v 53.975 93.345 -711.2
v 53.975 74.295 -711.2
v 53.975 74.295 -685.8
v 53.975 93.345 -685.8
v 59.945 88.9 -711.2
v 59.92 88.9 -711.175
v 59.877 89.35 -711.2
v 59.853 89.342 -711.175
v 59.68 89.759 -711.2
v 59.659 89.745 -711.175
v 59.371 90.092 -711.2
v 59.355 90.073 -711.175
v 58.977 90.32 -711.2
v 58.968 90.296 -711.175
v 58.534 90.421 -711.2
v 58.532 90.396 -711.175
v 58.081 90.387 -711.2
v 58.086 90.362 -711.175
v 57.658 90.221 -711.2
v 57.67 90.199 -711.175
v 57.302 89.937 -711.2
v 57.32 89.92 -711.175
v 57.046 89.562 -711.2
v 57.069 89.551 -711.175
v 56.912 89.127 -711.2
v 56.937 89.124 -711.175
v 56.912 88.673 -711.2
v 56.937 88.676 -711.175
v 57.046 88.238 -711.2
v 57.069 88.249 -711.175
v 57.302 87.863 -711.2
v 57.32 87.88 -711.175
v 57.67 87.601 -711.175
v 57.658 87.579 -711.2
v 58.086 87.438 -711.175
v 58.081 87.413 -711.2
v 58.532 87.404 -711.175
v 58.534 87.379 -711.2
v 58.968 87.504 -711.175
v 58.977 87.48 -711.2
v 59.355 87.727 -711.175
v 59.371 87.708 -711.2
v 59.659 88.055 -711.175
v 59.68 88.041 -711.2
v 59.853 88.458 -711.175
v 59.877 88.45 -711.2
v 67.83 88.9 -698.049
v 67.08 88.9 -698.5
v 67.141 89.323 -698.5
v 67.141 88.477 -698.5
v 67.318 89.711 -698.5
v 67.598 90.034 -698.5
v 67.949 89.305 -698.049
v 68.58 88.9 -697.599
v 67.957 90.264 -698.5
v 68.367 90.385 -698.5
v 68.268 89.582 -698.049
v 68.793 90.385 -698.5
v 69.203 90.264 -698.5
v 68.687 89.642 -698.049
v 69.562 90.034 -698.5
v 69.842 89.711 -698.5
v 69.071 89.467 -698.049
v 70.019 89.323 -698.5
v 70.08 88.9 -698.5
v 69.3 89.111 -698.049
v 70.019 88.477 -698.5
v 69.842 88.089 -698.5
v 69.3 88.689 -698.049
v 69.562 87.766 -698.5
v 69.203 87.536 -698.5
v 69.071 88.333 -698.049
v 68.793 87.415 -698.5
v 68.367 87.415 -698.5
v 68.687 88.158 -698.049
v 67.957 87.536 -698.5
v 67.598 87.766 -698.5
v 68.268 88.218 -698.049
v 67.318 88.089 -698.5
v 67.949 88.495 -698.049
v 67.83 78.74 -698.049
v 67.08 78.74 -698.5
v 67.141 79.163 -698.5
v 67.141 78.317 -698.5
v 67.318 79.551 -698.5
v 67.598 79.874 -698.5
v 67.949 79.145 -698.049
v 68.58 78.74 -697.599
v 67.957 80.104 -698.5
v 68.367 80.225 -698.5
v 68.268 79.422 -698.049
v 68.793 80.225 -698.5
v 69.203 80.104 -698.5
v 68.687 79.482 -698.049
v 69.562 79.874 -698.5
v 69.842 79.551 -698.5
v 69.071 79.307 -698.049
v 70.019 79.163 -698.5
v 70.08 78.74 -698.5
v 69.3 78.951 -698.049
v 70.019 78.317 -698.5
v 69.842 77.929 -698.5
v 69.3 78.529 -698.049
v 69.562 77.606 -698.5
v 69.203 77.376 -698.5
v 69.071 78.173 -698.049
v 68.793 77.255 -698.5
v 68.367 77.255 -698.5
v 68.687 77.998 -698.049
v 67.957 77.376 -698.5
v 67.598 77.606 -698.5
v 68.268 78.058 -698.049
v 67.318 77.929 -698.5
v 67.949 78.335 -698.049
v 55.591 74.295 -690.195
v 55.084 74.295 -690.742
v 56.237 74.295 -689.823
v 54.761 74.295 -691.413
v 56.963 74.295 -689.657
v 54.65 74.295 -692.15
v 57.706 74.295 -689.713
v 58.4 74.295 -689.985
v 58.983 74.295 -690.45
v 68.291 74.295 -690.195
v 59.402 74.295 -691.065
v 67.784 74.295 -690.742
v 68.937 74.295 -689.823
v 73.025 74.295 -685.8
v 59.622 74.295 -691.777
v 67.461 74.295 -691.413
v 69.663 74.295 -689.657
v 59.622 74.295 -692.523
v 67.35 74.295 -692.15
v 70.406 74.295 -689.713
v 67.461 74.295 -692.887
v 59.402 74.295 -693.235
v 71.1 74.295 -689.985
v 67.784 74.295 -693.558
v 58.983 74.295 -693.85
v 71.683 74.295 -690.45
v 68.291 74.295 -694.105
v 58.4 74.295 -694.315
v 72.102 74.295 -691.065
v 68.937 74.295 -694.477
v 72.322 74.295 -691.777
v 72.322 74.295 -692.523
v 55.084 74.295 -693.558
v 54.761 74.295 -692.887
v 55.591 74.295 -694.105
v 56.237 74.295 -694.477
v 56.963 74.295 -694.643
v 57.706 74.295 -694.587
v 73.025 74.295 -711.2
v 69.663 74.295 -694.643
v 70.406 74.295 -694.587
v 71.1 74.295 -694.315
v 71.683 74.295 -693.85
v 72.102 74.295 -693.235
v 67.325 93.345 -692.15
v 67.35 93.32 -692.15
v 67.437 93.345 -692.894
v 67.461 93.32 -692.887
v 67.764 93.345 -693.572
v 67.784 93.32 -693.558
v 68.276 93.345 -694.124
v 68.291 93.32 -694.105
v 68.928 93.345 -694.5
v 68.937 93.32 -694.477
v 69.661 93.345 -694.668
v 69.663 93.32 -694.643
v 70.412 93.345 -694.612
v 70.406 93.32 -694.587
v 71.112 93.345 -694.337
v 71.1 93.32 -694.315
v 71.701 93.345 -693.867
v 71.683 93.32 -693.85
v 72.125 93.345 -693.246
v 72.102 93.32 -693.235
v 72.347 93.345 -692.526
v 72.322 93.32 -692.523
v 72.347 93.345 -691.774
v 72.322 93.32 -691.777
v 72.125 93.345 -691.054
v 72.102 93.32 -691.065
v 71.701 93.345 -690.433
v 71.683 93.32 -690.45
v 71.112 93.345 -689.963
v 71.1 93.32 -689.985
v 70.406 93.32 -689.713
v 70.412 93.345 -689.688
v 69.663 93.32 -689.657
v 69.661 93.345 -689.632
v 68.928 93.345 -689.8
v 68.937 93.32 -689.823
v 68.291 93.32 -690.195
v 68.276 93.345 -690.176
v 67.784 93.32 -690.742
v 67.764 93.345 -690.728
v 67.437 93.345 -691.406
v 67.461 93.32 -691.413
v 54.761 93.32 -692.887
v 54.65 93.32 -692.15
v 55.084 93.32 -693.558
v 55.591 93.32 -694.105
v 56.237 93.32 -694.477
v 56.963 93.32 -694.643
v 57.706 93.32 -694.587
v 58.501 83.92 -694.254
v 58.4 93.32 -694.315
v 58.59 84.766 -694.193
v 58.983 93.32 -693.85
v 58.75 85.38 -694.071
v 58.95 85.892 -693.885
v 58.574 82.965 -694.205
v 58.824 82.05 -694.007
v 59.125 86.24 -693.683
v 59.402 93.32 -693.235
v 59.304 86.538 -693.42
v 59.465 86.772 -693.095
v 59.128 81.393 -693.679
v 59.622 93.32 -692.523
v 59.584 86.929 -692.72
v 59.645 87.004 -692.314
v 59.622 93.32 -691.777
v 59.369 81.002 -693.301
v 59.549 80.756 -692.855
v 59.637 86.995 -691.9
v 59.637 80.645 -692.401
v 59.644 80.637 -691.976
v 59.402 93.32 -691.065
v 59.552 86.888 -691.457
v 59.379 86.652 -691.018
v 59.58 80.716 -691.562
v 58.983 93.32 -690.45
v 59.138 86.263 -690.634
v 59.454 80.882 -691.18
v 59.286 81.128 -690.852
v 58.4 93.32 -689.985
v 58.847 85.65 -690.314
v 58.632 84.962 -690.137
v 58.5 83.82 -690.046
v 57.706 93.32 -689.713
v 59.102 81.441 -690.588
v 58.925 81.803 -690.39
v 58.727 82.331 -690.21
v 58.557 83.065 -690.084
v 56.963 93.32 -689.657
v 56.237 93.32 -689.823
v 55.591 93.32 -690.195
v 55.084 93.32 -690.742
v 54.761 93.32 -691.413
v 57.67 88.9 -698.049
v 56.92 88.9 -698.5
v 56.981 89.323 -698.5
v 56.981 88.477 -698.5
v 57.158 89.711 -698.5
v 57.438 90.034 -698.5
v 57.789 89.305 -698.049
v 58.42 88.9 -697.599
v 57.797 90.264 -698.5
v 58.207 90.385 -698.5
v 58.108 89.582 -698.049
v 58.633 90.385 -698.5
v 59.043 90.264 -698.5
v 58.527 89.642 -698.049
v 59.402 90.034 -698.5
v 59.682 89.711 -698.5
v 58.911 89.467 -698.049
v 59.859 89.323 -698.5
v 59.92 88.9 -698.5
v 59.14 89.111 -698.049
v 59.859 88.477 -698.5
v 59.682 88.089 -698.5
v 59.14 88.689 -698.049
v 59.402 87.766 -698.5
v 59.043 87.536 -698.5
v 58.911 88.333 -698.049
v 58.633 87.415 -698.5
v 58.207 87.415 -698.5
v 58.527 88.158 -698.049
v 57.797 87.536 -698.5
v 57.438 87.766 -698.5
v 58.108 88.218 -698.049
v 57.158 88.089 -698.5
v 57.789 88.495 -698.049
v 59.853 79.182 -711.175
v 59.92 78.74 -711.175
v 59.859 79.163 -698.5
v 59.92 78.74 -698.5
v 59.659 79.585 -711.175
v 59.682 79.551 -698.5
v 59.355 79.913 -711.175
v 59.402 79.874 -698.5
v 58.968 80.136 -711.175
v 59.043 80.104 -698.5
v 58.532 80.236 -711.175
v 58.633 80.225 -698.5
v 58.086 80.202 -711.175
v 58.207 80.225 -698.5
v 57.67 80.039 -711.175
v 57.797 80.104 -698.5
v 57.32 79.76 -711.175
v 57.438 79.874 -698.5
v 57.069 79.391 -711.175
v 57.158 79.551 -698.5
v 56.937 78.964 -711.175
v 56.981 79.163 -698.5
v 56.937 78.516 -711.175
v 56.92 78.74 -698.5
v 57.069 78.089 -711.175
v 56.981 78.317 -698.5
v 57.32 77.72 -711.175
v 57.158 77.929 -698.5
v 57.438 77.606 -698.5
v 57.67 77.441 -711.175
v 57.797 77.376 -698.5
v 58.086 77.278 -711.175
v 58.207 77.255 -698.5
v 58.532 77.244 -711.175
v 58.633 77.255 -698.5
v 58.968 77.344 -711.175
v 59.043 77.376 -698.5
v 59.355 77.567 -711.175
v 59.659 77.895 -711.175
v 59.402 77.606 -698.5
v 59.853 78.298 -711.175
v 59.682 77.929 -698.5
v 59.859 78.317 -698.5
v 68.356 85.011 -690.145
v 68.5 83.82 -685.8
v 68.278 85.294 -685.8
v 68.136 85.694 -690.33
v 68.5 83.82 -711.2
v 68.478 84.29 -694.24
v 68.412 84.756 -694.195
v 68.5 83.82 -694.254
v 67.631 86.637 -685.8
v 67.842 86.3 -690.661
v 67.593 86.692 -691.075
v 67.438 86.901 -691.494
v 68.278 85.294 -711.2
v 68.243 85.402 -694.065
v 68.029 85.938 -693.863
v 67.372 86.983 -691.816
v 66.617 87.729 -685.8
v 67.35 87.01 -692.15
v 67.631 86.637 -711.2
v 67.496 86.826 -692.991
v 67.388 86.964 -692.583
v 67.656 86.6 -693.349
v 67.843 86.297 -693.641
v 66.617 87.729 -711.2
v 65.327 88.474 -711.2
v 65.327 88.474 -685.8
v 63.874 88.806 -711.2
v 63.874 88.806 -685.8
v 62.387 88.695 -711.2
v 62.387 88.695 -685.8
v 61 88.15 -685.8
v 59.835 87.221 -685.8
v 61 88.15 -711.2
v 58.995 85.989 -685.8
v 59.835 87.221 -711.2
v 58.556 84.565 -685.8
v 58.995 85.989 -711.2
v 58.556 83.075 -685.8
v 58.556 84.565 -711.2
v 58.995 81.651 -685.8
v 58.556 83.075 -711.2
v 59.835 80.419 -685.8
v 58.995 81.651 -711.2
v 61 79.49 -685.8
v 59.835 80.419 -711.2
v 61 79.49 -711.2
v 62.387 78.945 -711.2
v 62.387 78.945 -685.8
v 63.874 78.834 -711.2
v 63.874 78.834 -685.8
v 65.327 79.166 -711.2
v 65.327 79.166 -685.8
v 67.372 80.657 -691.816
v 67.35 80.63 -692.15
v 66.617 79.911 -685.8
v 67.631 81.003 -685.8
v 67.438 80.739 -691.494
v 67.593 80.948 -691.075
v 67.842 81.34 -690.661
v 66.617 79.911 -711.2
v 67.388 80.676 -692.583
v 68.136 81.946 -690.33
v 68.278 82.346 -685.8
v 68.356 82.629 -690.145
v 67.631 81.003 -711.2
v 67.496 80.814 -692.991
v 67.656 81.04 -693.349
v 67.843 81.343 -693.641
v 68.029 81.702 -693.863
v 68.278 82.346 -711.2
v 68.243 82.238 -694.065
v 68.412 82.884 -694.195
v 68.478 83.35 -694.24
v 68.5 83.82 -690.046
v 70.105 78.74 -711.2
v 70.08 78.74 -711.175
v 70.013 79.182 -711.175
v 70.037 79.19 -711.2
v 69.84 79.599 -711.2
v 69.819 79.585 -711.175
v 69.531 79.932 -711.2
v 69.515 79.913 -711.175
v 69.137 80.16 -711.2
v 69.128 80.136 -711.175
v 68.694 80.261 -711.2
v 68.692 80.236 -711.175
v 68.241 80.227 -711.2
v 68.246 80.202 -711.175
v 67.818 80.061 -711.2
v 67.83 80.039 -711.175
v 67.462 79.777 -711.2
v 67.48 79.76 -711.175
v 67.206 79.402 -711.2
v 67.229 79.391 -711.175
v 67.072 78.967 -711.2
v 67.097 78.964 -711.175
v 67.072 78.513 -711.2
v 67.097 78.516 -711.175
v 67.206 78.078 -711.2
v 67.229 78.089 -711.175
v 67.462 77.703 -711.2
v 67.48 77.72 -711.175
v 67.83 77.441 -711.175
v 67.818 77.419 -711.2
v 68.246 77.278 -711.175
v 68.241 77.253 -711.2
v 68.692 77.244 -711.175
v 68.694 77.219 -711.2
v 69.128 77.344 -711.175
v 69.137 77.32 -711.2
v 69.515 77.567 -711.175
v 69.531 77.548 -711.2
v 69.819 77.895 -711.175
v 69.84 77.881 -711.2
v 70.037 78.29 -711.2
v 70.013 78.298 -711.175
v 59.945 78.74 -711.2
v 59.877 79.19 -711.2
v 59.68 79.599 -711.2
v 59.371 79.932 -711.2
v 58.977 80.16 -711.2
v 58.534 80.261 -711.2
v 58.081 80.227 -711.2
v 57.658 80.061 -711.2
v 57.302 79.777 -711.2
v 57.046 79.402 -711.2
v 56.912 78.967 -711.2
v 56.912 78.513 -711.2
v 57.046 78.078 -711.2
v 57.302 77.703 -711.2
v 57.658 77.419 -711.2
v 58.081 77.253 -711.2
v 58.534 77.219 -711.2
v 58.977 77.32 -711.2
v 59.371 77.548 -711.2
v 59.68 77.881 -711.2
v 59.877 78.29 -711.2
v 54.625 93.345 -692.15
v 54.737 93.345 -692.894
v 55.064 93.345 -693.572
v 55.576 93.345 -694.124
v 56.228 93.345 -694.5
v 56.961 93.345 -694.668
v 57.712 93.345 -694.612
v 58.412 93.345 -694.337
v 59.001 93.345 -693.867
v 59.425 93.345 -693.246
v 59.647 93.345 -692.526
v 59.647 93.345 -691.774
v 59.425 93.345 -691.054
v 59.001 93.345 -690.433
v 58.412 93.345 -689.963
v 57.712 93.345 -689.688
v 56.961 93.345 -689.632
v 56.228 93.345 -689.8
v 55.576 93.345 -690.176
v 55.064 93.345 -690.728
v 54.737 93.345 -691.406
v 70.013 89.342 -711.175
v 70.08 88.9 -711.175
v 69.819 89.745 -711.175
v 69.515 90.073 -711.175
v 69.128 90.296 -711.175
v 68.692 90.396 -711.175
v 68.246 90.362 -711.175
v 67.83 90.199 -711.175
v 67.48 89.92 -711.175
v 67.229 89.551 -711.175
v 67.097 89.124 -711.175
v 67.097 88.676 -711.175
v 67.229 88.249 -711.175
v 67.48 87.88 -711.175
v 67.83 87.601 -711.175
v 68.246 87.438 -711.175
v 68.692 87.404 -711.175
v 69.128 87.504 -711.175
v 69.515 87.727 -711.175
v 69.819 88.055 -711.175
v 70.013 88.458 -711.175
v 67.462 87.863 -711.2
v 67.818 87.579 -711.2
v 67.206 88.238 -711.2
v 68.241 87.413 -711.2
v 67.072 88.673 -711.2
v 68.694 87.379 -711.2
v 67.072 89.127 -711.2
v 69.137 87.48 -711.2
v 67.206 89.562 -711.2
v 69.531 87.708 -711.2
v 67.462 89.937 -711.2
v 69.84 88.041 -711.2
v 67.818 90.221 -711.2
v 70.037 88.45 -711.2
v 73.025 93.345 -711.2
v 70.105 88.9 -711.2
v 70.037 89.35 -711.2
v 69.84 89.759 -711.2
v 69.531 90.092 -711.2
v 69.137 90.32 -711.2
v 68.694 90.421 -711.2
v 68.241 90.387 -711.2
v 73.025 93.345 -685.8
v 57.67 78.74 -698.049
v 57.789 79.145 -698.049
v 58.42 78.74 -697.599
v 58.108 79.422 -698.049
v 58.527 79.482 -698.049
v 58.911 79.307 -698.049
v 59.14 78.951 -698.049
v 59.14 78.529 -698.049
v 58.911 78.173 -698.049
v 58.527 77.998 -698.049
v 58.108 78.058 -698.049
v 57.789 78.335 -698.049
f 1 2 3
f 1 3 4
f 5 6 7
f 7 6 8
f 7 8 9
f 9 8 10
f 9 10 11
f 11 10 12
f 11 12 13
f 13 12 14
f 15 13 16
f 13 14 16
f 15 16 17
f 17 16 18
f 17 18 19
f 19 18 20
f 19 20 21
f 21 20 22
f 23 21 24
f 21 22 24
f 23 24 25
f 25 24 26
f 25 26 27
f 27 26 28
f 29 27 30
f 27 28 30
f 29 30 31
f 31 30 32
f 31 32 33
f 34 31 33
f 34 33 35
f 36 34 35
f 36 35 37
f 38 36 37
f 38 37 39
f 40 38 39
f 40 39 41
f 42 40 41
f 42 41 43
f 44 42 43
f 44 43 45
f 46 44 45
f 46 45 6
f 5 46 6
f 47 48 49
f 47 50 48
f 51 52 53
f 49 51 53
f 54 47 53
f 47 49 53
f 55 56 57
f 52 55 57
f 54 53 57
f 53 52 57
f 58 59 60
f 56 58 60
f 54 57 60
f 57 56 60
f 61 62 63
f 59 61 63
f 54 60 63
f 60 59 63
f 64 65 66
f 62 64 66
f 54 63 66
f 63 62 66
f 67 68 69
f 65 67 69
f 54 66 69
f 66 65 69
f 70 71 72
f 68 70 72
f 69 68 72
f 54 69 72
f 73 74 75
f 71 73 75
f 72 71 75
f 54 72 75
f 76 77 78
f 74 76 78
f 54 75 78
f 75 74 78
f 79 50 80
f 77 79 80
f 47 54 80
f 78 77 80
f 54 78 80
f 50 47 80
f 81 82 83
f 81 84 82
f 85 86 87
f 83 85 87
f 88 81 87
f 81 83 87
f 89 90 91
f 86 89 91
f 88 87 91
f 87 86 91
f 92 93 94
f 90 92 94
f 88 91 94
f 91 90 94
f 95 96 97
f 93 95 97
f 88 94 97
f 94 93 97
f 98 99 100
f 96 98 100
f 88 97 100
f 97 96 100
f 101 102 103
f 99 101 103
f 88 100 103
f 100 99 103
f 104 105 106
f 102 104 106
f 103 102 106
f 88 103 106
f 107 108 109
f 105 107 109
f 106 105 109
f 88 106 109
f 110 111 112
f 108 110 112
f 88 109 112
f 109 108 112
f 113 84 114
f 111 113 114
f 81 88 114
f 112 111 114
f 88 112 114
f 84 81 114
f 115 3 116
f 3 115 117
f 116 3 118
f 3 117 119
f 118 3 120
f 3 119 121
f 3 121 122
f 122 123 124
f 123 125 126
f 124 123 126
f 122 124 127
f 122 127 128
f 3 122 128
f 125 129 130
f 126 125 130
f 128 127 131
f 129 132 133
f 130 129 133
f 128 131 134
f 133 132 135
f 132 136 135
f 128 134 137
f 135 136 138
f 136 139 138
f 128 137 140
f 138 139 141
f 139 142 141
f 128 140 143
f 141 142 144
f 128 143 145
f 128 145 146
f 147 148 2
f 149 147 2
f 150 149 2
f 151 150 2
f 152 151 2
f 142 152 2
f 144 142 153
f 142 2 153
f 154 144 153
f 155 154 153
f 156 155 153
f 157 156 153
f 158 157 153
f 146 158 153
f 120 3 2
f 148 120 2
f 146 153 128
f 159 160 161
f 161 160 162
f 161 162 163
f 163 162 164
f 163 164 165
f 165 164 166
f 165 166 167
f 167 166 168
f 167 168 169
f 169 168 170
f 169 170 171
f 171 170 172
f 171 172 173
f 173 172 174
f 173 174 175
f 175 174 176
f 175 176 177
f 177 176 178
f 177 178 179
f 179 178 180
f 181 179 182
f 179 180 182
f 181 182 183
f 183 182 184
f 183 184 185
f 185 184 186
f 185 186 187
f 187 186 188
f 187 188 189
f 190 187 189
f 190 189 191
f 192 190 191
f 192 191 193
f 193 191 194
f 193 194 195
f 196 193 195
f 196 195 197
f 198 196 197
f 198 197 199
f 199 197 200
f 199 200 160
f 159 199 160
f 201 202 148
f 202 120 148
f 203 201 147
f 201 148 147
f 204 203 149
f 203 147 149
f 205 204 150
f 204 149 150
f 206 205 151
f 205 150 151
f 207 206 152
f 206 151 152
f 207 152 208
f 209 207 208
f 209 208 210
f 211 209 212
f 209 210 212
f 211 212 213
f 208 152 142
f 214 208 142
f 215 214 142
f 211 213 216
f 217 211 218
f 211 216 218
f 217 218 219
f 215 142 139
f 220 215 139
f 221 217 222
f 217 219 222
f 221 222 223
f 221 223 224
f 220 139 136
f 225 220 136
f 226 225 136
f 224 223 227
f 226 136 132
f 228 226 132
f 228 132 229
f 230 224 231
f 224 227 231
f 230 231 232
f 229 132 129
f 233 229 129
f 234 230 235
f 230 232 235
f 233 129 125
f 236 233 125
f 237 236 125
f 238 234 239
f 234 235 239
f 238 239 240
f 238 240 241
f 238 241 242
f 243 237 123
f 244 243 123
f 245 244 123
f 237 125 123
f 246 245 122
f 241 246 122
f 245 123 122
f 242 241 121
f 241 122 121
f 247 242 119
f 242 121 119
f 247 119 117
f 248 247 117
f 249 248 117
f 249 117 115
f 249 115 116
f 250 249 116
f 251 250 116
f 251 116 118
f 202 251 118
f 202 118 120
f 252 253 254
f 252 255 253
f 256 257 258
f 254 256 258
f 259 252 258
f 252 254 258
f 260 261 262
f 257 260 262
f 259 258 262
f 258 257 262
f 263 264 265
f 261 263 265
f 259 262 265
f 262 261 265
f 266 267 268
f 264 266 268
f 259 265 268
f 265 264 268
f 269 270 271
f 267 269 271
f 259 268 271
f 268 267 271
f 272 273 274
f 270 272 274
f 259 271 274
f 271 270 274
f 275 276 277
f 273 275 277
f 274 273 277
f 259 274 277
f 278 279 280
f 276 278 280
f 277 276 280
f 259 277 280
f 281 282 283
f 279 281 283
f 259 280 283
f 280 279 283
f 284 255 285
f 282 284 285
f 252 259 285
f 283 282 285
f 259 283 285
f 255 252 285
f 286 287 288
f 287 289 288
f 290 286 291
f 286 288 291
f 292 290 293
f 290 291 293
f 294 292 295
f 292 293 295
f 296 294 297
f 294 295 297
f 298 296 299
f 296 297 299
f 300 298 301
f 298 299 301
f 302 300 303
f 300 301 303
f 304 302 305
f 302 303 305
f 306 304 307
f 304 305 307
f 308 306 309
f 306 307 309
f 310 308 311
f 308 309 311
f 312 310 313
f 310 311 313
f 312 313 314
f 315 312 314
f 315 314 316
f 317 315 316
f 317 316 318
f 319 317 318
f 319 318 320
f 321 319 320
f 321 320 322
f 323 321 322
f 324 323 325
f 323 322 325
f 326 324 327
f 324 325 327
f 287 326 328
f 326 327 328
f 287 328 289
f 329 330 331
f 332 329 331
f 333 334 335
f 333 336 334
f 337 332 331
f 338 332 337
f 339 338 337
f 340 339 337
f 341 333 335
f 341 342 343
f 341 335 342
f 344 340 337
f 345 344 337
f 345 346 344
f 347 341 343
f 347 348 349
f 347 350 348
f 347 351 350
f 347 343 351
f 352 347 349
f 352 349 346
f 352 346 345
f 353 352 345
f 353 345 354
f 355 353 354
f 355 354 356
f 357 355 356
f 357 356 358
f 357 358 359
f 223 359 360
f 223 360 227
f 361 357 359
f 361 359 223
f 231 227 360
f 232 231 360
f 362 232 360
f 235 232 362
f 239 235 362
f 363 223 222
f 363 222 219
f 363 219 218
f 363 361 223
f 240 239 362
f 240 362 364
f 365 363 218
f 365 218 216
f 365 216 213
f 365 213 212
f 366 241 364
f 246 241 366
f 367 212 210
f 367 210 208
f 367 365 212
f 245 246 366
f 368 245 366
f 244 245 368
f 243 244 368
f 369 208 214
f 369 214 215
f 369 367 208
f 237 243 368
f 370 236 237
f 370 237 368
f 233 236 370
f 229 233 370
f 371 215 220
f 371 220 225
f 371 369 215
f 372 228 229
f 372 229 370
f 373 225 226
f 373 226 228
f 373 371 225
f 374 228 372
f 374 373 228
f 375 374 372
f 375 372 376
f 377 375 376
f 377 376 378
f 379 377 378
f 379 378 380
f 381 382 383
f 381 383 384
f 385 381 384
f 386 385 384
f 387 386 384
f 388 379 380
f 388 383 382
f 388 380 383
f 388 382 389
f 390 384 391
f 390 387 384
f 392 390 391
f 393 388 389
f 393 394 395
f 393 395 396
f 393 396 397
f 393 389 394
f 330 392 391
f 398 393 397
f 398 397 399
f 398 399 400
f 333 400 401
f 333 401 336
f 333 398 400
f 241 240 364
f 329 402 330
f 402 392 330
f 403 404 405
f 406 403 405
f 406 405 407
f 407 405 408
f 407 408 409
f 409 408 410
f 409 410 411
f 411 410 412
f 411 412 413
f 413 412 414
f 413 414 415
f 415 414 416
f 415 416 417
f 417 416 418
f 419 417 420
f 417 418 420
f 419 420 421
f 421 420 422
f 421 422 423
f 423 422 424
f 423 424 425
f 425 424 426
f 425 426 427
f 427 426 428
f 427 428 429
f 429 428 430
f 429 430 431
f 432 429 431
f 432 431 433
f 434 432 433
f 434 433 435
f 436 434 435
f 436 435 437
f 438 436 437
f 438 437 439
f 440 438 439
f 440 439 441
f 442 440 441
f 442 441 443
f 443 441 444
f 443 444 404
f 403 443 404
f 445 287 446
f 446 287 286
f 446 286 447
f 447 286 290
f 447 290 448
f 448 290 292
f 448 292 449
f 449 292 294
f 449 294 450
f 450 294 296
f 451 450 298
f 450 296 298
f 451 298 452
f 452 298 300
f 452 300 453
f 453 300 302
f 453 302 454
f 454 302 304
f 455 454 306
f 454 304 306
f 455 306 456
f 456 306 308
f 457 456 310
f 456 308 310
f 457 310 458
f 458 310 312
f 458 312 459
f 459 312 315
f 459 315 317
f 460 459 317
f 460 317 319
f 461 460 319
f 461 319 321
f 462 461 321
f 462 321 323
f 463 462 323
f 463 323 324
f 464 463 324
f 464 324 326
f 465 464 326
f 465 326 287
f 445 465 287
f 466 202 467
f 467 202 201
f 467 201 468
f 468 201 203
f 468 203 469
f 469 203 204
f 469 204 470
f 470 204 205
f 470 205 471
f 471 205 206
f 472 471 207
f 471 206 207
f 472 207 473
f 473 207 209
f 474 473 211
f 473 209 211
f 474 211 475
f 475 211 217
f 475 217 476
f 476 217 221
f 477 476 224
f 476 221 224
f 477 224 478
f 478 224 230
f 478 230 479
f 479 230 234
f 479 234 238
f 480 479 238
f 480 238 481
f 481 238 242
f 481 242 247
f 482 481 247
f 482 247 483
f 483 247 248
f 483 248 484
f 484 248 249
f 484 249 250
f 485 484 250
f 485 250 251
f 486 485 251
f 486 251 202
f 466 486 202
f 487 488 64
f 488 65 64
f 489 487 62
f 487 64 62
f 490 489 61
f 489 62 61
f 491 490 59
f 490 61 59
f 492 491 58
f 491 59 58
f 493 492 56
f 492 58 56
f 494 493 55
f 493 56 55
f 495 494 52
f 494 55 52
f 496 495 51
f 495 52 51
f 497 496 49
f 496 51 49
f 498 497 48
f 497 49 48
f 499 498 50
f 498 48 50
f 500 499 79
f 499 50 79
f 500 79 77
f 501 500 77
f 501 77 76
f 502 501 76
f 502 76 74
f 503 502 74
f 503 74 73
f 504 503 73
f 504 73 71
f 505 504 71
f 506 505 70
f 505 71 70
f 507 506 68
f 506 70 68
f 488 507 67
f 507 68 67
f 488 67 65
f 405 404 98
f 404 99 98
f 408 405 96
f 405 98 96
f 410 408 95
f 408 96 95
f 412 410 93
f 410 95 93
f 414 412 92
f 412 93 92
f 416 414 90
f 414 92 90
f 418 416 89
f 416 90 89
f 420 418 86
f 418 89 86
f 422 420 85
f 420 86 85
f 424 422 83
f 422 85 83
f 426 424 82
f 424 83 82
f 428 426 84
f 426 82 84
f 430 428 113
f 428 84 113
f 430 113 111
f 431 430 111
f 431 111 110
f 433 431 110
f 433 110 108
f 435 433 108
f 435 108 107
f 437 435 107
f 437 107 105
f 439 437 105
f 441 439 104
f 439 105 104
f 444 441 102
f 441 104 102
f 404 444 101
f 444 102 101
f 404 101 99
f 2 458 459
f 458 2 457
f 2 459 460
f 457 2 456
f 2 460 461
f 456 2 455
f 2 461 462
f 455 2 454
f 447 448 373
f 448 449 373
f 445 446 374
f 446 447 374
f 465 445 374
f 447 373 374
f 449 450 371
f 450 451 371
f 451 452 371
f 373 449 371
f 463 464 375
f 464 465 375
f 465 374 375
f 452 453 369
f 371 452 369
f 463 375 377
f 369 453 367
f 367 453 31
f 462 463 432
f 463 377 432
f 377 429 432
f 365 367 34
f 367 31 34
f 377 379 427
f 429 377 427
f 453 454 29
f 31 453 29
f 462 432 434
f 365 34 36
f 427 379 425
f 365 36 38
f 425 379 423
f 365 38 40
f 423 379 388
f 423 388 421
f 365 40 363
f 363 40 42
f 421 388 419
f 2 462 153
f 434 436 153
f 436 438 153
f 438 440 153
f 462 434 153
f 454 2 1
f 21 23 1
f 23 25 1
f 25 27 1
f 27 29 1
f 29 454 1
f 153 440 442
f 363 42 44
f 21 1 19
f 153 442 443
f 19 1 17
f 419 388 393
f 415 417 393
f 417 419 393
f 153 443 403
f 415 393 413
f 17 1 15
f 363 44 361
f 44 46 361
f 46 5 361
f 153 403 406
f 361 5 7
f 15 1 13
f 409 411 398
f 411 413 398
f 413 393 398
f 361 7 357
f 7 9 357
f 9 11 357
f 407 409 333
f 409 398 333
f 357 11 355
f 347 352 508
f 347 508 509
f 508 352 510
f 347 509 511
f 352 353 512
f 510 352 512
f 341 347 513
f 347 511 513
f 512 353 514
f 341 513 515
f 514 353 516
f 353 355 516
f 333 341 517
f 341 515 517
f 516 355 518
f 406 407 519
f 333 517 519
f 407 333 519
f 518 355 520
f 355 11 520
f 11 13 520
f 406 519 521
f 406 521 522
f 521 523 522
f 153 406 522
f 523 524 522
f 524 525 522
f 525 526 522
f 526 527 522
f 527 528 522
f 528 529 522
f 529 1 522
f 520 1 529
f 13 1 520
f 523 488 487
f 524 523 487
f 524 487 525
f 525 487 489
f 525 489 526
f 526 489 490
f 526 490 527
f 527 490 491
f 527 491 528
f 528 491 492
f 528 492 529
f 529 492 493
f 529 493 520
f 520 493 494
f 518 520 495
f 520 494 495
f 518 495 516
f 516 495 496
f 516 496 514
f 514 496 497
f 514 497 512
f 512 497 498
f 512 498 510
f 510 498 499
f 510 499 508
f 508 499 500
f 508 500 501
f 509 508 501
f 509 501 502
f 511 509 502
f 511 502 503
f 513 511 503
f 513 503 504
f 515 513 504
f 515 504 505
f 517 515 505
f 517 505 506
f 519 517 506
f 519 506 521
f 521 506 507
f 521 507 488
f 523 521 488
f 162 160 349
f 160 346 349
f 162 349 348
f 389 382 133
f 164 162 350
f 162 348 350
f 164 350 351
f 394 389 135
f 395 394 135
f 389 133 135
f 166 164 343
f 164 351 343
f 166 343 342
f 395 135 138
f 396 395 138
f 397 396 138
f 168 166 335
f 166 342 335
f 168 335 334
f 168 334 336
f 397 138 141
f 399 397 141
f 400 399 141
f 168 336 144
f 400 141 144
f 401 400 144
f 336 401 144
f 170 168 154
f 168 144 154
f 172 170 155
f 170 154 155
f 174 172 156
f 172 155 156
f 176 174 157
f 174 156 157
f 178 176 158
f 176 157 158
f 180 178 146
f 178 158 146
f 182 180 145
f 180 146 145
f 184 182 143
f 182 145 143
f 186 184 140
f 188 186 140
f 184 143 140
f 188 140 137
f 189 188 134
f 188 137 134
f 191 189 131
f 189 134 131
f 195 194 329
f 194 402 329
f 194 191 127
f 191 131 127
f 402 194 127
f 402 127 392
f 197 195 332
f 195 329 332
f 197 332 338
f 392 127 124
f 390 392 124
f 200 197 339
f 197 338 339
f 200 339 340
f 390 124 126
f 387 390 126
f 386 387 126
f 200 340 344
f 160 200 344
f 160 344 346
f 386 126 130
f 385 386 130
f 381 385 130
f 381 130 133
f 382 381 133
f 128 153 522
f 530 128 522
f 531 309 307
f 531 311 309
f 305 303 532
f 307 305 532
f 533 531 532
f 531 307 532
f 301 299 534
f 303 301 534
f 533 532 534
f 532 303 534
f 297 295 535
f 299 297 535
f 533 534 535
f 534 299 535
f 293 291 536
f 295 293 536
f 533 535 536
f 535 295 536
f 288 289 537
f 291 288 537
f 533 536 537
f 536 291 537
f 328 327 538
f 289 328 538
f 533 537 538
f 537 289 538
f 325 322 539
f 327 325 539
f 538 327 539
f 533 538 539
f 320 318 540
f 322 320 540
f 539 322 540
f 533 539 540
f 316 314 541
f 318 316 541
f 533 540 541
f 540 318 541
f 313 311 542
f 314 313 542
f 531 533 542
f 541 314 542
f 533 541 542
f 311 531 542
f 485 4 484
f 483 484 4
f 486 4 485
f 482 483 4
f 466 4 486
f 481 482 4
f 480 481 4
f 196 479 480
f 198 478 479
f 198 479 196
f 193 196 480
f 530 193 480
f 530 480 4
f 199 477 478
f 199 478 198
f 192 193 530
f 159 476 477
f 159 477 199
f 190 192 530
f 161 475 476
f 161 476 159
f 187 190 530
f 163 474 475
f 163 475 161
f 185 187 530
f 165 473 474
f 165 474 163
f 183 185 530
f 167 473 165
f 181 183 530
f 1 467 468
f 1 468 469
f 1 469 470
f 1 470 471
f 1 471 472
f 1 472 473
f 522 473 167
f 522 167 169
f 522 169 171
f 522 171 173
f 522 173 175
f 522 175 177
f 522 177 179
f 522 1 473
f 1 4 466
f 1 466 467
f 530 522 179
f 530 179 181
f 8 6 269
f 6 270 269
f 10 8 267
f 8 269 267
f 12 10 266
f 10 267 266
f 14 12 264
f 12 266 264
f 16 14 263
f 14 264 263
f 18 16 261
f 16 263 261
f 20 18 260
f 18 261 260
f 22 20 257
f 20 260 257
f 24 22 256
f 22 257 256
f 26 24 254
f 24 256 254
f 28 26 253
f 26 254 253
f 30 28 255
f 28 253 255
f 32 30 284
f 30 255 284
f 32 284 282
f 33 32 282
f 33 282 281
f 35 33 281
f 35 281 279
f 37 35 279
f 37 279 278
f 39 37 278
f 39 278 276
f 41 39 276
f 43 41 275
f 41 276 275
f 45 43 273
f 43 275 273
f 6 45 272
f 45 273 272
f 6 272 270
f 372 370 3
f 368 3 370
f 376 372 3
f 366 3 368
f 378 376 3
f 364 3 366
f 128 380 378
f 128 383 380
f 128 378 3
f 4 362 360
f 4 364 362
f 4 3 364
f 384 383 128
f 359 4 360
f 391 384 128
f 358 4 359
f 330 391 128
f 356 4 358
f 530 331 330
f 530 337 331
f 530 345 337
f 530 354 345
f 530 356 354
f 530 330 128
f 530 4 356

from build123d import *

# Parameters (mm, degrees)
BOSS_EXTRUDE1_START             = -711.2
SKETCH5_W                       = 19.05
SKETCH5_H                       = 19.05
SKETCH5_R                       = 5
BOSS_EXTRUDE1_DEPTH             = 25.4
F_5_0MM_DOWEL_HOLE2_D           = 5
F_5_0MM_DOWEL_HOLE2_DEPTH       = 25.4
F_5_0MM_DOWEL_HOLE2_CSINK_D     = 5.05
F_5_0MM_DOWEL_HOLE2_CSINK_ANGLE = 90
F_5_0MM_DOWEL_HOLE2_TIP         = 1.502151548
F_3_0MM_DOWEL_HOLE2_D           = 3
F_3_0MM_DOWEL_HOLE2_DEPTH       = 12.7
F_3_0MM_DOWEL_HOLE2_CSINK_D     = 3.05
F_3_0MM_DOWEL_HOLE2_CSINK_ANGLE = 90
F_3_0MM_DOWEL_HOLE2_TIP         = 0.901290929


with BuildPart() as part:
    # Sketch5 → Boss-Extrude1 (new body)
    with BuildSketch(Plane.XY.offset(BOSS_EXTRUDE1_START)):
        with Locations((63.5, 83.82)):
            Rectangle(SKETCH5_W, SKETCH5_H)
        with Locations((63.5, 83.82)):
            Circle(SKETCH5_R, mode=Mode.SUBTRACT)
    extrude(amount=BOSS_EXTRUDE1_DEPTH)

    # Ø5.0mm Dowel Hole2
    with Locations(Plane(origin=(0, 93.345, 0), x_dir=(1, 0, 0), z_dir=(0, 1, 0))):
        with Locations((57.15, 692.15), (69.85, 692.15)):
            CounterSinkHole(F_5_0MM_DOWEL_HOLE2_D / 2, F_5_0MM_DOWEL_HOLE2_CSINK_D / 2, depth=F_5_0MM_DOWEL_HOLE2_DEPTH, counter_sink_angle=F_5_0MM_DOWEL_HOLE2_CSINK_ANGLE)
            with Locations((0, 0, -(F_5_0MM_DOWEL_HOLE2_DEPTH + F_5_0MM_DOWEL_HOLE2_TIP / 2))):  # 118° drill point
                Cone(0, F_5_0MM_DOWEL_HOLE2_D / 2, F_5_0MM_DOWEL_HOLE2_TIP, mode=Mode.SUBTRACT)

    # Ø3.0mm Dowel Hole2
    with Locations(Plane(origin=(0, 0, -711.2), x_dir=(-1, 0, 0), z_dir=(0, 0, -1))):
        with Locations((-58.42, 78.74), (-68.58, 78.74), (-58.42, 88.9), (-68.58, 88.9)):
            CounterSinkHole(F_3_0MM_DOWEL_HOLE2_D / 2, F_3_0MM_DOWEL_HOLE2_CSINK_D / 2, depth=F_3_0MM_DOWEL_HOLE2_DEPTH, counter_sink_angle=F_3_0MM_DOWEL_HOLE2_CSINK_ANGLE)
            with Locations((0, 0, -(F_3_0MM_DOWEL_HOLE2_DEPTH + F_3_0MM_DOWEL_HOLE2_TIP / 2))):  # 118° drill point
                Cone(0, F_3_0MM_DOWEL_HOLE2_D / 2, F_3_0MM_DOWEL_HOLE2_TIP, mode=Mode.SUBTRACT)


solid = part.part
